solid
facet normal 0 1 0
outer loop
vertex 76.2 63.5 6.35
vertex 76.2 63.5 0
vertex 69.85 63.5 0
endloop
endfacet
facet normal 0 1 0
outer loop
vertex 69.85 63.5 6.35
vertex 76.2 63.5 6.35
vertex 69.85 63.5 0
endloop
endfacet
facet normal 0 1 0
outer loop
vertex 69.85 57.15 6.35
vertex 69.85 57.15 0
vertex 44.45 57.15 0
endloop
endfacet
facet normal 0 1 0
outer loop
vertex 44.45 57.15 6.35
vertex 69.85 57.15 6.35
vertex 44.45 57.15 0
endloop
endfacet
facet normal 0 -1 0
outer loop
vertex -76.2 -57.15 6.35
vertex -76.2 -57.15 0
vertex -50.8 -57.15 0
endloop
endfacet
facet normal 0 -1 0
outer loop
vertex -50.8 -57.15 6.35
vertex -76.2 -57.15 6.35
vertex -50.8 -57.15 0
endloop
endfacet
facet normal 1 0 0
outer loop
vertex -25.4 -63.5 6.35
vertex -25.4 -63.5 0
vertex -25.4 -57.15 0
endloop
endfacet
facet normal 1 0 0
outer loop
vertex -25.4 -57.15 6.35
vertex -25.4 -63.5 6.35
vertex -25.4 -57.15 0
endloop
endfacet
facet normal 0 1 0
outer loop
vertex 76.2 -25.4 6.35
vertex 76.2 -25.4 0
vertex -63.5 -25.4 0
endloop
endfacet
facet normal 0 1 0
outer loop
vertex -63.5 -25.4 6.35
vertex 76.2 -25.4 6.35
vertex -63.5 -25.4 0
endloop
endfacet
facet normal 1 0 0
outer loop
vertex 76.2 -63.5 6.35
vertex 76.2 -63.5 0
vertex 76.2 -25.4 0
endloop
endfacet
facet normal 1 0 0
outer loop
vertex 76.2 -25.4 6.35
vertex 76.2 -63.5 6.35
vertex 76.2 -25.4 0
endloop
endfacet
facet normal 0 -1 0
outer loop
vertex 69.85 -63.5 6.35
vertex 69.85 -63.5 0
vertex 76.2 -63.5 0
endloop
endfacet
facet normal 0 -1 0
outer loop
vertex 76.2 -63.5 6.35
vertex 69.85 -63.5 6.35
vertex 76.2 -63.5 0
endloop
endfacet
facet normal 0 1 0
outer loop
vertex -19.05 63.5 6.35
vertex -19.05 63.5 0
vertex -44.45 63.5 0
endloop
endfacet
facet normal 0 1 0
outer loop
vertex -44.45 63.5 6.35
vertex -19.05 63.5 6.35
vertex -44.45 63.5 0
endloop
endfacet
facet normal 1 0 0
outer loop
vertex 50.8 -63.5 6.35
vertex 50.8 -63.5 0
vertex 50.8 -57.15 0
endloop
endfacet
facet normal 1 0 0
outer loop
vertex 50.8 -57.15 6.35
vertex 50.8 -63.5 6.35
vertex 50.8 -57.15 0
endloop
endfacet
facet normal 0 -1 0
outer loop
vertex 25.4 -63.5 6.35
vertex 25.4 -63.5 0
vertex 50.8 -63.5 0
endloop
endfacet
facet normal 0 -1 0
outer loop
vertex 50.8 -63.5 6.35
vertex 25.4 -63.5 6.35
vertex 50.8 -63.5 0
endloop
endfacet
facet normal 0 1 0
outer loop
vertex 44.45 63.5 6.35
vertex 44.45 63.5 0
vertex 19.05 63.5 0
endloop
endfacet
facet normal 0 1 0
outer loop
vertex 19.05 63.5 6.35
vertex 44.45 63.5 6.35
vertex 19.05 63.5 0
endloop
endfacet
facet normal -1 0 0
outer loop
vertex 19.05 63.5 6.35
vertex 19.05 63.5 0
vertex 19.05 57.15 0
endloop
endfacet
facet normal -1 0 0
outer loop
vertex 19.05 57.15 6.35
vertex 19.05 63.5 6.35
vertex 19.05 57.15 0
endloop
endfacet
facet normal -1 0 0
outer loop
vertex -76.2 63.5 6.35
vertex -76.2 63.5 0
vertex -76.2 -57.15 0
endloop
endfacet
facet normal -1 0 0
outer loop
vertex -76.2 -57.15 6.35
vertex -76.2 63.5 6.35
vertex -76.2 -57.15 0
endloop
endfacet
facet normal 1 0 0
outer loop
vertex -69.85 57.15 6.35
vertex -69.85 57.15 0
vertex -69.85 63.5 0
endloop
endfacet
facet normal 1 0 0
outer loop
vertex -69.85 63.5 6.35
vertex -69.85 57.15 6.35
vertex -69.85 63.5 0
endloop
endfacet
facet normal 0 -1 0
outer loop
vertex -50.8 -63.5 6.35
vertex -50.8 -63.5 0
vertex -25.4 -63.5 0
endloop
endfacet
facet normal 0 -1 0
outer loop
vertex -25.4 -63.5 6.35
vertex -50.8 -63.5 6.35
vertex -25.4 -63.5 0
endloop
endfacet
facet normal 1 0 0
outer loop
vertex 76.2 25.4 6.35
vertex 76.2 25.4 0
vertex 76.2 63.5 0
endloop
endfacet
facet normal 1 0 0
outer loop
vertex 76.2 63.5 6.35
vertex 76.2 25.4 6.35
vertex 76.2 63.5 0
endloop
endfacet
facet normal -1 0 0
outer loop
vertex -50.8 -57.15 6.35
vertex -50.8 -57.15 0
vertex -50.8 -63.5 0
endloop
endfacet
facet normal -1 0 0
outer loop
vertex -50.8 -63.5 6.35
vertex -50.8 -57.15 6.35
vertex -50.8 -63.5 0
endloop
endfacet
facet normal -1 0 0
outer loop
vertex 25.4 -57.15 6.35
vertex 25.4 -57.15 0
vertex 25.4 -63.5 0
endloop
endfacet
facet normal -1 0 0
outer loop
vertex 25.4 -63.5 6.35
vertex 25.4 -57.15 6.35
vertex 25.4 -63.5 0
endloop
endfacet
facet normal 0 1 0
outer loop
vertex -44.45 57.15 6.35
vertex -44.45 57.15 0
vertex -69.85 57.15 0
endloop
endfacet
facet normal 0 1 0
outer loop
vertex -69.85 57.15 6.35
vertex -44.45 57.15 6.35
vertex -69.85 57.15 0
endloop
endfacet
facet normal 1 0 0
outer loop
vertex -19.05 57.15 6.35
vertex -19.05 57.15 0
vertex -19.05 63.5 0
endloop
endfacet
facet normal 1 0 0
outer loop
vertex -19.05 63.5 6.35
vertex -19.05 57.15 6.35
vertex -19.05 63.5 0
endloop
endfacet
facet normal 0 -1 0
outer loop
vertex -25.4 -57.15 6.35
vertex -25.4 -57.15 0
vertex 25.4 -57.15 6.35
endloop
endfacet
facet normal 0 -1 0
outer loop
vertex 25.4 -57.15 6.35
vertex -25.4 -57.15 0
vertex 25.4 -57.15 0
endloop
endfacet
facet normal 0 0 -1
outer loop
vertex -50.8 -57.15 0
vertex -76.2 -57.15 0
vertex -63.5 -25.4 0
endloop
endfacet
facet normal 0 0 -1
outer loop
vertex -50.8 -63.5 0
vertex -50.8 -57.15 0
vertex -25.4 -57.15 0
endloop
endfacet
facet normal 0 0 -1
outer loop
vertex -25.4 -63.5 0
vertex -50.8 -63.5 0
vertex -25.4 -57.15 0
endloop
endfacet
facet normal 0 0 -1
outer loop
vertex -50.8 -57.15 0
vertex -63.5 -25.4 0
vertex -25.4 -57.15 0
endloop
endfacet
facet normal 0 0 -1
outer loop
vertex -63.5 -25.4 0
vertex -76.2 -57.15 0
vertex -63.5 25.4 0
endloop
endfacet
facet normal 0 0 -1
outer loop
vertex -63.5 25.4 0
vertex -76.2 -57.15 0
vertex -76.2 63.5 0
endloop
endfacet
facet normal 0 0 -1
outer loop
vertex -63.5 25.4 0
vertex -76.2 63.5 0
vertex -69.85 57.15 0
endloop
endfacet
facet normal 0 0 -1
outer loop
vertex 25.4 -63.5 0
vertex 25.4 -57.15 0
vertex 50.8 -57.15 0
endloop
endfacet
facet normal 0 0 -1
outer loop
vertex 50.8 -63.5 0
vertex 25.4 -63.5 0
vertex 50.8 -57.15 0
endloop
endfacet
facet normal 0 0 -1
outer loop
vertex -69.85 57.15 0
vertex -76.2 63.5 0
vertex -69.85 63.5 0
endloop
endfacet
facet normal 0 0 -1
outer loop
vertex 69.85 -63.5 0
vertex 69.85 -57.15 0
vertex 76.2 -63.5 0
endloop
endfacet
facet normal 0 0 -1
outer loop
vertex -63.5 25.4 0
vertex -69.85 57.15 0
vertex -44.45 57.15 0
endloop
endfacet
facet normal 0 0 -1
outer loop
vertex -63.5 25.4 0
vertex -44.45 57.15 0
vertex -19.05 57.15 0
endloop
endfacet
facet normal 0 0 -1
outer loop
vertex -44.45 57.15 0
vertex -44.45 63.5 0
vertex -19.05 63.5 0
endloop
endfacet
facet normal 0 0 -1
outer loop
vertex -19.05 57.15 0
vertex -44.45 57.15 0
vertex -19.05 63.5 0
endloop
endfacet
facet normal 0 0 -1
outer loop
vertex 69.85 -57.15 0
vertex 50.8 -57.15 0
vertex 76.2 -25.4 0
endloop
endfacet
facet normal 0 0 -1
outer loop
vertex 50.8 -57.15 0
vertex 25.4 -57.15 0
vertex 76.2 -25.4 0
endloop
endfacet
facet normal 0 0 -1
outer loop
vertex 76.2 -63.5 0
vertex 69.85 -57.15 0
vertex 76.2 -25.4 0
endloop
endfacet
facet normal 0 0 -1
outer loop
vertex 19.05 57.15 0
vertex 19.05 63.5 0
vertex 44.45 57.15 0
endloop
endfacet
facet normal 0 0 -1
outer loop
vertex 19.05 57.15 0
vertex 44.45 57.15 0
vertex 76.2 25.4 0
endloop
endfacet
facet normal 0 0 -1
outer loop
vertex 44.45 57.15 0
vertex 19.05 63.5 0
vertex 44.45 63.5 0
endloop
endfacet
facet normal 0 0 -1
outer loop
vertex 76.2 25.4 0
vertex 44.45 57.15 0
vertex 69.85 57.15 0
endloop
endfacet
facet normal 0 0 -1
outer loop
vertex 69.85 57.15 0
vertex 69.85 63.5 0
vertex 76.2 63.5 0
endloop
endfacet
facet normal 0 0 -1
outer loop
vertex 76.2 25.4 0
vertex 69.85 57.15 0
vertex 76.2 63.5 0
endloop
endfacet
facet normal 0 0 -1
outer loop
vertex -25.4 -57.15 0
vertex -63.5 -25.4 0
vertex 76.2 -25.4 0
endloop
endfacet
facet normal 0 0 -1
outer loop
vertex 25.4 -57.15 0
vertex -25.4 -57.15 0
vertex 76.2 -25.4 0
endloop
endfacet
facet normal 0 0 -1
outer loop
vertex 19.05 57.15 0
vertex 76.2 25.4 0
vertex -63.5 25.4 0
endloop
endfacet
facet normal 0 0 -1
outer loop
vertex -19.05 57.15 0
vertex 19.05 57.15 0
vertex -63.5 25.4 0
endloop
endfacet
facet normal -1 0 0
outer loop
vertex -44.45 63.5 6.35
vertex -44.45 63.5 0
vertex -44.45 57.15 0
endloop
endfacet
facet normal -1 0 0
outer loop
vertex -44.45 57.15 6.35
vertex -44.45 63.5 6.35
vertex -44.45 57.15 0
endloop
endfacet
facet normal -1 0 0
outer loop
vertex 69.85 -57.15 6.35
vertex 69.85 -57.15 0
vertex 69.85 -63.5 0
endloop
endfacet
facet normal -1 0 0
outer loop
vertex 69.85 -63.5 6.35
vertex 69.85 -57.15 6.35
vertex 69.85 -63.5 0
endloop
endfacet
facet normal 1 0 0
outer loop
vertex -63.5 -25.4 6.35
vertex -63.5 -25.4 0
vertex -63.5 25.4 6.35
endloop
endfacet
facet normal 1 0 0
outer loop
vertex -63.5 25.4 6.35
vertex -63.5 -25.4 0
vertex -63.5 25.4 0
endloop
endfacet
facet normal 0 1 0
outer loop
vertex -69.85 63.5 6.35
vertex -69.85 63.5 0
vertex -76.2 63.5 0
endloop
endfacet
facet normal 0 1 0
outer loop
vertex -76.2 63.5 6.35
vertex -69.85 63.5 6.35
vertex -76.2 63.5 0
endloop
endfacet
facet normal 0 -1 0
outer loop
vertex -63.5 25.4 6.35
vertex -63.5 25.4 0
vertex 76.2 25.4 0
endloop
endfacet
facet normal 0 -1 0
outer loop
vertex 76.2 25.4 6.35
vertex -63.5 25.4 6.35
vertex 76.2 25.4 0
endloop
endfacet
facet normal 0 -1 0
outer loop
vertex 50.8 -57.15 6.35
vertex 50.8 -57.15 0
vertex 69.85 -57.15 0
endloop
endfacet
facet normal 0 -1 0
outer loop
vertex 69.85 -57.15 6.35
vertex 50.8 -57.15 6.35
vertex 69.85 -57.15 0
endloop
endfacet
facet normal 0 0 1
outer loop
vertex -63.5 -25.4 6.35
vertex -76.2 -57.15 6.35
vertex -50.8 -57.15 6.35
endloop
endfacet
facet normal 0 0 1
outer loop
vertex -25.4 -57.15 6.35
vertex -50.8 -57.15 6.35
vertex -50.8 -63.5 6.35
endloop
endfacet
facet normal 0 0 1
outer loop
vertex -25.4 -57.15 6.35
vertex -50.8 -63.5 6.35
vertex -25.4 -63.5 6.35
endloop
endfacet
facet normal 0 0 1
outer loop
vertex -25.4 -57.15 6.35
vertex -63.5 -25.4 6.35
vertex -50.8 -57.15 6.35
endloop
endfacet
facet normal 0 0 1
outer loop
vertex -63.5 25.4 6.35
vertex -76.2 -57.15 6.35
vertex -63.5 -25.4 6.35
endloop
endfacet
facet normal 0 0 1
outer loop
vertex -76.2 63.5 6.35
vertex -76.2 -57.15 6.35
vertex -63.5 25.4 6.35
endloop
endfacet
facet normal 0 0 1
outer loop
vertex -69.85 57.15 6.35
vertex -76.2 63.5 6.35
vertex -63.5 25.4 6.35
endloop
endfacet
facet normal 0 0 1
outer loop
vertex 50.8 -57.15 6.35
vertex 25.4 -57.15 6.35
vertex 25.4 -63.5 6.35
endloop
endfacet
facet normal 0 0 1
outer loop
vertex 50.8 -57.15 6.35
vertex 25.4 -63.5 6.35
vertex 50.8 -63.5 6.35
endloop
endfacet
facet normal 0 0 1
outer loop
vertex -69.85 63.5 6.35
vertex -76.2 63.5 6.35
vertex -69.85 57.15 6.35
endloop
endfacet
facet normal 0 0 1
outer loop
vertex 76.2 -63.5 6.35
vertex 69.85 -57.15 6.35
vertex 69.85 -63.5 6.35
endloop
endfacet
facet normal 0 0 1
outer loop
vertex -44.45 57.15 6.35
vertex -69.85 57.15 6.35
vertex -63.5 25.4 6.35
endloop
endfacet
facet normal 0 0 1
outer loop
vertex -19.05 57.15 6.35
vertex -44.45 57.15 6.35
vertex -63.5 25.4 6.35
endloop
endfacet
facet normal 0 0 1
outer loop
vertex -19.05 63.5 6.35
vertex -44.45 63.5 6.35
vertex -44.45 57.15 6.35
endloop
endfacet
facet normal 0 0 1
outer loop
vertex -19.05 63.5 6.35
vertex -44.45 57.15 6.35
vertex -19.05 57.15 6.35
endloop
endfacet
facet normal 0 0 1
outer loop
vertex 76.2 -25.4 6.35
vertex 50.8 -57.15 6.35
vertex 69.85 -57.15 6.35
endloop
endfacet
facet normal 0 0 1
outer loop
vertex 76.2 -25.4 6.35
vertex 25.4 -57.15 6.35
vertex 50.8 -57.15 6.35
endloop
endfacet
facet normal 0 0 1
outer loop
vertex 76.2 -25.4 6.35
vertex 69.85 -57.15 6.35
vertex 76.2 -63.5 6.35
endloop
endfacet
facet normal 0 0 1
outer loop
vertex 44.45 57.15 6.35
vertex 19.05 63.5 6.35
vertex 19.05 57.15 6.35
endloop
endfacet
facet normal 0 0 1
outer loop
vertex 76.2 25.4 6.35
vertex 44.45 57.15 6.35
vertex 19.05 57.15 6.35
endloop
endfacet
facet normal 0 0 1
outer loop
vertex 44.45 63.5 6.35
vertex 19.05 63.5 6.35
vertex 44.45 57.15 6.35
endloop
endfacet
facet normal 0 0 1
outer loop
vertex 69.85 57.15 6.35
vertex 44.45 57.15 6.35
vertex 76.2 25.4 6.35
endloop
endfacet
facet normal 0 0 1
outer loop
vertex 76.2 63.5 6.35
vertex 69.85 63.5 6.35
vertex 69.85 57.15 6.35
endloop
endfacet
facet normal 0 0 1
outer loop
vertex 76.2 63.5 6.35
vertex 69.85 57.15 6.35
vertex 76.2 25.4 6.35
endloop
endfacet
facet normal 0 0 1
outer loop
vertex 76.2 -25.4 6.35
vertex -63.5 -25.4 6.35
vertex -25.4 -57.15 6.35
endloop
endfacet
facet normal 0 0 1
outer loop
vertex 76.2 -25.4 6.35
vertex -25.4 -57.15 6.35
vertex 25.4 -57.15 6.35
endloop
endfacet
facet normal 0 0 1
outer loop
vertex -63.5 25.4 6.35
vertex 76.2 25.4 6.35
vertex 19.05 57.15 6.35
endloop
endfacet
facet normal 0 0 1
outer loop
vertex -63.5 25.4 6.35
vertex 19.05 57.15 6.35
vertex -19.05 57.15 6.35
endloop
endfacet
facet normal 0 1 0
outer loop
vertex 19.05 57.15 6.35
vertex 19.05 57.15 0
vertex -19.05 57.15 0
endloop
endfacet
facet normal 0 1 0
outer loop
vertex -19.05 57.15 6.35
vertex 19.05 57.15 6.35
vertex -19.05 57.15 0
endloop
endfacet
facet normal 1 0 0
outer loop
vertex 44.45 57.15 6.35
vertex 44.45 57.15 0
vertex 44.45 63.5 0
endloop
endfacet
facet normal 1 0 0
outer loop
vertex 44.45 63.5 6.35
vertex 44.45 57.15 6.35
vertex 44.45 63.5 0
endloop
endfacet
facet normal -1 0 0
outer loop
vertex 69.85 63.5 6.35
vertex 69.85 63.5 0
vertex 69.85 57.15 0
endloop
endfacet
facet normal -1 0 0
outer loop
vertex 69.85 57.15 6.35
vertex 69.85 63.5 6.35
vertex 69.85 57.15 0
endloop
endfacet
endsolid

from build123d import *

# Parameters (mm, degrees)
F0_W     = 6.35
F0_H     = 6.35
F1_DEPTH = 6.35


with BuildPart() as f1:
    # F0 (on Top) → F1 (new body)
    with BuildSketch(Plane.XY):
        Polygon((76.2, 50.8), (76.2, 63.5), (69.85, 63.5), (69.85, 57.15), (63.5, 57.15), (57.15, 57.15), (50.8, 57.15), (44.45, 57.15), (44.45, 63.5), (38.1, 63.5), (31.75, 63.5), (25.4, 63.5), (19.05, 63.5), (19.05, 57.15), (-19.05, 57.15), (-19.05, 63.5), (-25.4, 63.5), (-31.75, 63.5), (-38.1, 63.5), (-44.45, 63.5), (-44.45, 57.15), (-69.85, 57.15), (-69.85, 63.5), (-76.2, 63.5), (-76.2, 50.8), (-76.2, 44.45), (-69.85, 44.45), (-69.85, 38.1), (-76.2, 38.1), (-76.2, 31.75), (-69.85, 31.75), (-69.85, 25.4), (-76.2, 25.4), (-76.2, 19.05), (-69.85, 19.05), (-69.85, 12.7), (-76.2, 12.7), (-76.2, 6.35), (-69.85, 6.35), (-69.85, 0), (-76.2, 0), (-76.2, -6.35), (-69.85, -6.35), (-69.85, -12.7), (-76.2, -12.7), (-76.2, -19.05), (-69.85, -19.05), (-69.85, -25.4), (-76.2, -25.4), (-76.2, -31.75), (-69.85, -31.75), (-69.85, -38.1), (-76.2, -38.1), (-76.2, -44.45), (-69.85, -44.45), (-69.85, -50.8), (-76.2, -50.8), (-76.2, -57.15), (-69.85, -57.15), (-50.8, -57.15), (-50.8, -63.5), (-44.45, -63.5), (-38.1, -63.5), (-31.75, -63.5), (-25.4, -63.5), (-25.4, -57.15), (-19.05, -57.15), (-12.7, -57.15), (-6.35, -57.15), (0, -57.15), (6.35, -57.15), (12.7, -57.15), (19.05, -57.15), (25.4, -57.15), (25.4, -63.5), (31.75, -63.5), (38.1, -63.5), (44.45, -63.5), (50.8, -63.5), (50.8, -57.15), (57.15, -57.15), (69.85, -57.15), (69.85, -63.5), (76.2, -63.5), (76.2, -50.8), (76.2, -44.45), (76.2, -38.1), (76.2, -31.75), (76.2, -25.4), (-63.5, -25.4), (-63.5, 25.4), (76.2, 25.4), (76.2, 31.75), (76.2, 38.1), (76.2, 44.45), align=None)
        with Locations((-73.025, 41.275)):
            Rectangle(F0_W, F0_H)
        with Locations((-73.025, 28.575)):
            Rectangle(F0_W, F0_H)
        with Locations((-73.025, 15.875)):
            Rectangle(F0_W, F0_H)
        with Locations((-73.025, 3.175)):
            Rectangle(F0_W, F0_H)
        with Locations((-73.025, -9.525)):
            Rectangle(F0_W, F0_H)
        with Locations((-73.025, -22.225)):
            Rectangle(F0_W, F0_H)
        with Locations((-73.025, -34.925)):
            Rectangle(F0_W, F0_H)
        with Locations((-73.025, -47.625)):
            Rectangle(F0_W, F0_H)
    extrude(amount=F1_DEPTH)


solid = f1.part
